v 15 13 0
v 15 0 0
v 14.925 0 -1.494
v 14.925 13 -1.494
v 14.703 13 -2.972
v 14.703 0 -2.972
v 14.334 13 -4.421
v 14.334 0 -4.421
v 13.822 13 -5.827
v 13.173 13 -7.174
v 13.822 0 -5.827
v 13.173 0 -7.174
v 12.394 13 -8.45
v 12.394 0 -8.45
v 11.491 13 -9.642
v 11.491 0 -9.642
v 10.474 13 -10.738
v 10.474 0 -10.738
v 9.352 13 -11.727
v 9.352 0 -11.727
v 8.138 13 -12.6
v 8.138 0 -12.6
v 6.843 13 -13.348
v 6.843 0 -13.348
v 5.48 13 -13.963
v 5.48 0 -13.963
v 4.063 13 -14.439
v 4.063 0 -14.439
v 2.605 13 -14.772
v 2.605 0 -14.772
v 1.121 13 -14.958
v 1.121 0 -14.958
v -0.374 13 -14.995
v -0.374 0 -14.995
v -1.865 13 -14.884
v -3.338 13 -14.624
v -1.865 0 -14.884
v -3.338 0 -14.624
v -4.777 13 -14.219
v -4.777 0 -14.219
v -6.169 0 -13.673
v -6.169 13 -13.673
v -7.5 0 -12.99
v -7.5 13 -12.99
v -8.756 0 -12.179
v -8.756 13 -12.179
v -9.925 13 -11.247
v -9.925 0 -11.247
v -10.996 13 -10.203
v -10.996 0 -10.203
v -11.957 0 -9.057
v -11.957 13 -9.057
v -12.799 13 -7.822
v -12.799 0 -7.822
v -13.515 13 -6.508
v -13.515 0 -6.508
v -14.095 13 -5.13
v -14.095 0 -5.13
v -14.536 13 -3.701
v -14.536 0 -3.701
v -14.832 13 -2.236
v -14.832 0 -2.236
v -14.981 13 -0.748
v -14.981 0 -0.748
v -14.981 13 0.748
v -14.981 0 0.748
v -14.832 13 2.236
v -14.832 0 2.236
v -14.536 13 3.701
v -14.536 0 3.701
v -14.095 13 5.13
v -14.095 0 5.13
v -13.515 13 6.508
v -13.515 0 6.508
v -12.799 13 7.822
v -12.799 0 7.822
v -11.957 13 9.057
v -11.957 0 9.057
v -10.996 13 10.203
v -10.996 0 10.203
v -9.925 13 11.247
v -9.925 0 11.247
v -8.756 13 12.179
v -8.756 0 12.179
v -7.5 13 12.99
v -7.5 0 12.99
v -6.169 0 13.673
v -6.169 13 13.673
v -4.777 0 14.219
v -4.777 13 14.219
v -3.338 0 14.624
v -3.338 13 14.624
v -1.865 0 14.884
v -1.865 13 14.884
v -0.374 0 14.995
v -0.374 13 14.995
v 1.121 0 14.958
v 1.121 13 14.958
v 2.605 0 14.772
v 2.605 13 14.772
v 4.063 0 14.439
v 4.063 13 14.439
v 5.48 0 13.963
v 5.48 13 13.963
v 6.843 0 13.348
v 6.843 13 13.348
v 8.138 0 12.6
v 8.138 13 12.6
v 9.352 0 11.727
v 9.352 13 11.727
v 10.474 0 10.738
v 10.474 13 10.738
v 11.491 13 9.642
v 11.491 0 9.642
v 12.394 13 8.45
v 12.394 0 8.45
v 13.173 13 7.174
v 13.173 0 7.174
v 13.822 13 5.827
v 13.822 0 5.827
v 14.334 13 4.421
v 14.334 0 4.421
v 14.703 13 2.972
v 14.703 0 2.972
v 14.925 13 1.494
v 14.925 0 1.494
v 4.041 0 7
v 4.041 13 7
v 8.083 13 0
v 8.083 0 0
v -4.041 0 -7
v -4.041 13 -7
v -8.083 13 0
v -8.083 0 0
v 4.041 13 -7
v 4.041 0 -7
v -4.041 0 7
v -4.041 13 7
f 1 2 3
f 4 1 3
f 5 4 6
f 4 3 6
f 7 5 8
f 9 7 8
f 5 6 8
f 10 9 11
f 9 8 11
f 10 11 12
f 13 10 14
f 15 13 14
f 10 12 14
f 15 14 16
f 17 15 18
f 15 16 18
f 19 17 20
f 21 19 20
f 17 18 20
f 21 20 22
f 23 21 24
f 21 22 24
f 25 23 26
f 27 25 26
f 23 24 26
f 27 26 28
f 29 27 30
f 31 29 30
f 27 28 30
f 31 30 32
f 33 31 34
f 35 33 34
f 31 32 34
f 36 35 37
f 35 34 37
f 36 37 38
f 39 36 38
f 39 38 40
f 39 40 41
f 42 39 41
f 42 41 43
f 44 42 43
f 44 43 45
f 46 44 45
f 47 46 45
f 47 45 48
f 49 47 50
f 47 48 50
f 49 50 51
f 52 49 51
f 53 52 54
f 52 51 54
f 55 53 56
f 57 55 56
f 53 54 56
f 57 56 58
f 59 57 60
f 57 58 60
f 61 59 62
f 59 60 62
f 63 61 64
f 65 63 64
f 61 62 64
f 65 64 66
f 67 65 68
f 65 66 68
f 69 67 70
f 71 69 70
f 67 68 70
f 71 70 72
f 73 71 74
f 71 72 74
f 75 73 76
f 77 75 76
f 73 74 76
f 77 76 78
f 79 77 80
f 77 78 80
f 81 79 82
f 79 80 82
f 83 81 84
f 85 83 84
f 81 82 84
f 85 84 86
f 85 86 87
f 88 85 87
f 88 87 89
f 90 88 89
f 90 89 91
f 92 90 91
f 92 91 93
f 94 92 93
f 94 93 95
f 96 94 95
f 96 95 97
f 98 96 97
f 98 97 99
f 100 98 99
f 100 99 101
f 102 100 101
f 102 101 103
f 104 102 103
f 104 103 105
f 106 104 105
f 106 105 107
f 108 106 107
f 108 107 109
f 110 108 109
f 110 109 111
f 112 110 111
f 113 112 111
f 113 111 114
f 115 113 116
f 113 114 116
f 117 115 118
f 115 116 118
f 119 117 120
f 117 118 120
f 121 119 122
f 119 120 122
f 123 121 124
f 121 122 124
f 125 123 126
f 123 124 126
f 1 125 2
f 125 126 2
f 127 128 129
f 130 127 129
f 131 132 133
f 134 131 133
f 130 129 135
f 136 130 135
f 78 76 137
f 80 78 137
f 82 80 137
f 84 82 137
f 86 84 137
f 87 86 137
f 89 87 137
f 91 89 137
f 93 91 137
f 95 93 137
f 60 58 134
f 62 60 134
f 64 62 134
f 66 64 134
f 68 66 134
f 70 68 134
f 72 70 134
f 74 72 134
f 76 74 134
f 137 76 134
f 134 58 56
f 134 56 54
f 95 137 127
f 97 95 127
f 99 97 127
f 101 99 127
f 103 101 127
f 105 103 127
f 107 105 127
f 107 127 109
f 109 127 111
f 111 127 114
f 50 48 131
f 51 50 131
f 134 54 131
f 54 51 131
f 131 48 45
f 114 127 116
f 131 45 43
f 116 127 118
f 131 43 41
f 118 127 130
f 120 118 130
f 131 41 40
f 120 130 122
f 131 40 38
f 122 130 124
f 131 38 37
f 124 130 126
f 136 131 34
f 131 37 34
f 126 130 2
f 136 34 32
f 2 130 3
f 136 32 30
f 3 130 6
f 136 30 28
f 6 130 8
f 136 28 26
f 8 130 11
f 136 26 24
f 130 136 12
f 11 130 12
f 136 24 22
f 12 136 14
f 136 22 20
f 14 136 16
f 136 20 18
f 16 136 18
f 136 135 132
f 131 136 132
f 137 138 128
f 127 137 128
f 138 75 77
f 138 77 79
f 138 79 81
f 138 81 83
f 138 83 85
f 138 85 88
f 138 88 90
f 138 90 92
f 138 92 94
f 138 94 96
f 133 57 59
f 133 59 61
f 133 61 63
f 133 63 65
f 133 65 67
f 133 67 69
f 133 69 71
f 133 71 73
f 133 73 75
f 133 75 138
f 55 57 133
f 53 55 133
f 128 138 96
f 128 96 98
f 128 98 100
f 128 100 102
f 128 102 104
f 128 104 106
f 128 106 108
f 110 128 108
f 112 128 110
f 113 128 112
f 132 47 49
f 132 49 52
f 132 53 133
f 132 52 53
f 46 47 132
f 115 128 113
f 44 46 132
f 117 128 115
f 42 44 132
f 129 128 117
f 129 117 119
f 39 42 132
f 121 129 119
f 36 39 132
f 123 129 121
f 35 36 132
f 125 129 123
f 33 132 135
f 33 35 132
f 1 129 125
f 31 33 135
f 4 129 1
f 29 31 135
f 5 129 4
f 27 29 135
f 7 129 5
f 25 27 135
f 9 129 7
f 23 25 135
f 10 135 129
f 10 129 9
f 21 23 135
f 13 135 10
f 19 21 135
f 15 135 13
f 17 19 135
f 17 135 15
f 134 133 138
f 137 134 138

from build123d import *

# Parameters (mm, degrees)
SKETCH1_R               = 15
BOSS_EXTRUDE1_DEPTH     = 13
CUT_EXTRUDE1_DEPTH      = 26
CUT_EXTRUDE1_DEPTH_BACK = 32


with BuildPart() as part:
    # Sketch1 → Boss-Extrude1 (new body)
    with BuildSketch(Plane(origin=(0, 0, 0), x_dir=(1, 0, 0), z_dir=(0, 1, 0))):
        Circle(SKETCH1_R)
    extrude(amount=BOSS_EXTRUDE1_DEPTH)

    # Sketch3 → Cut-Extrude1 (cut, two sides)
    with BuildSketch(Plane(origin=(0, 13, 0), x_dir=(1, 0, 0), z_dir=(0, 1, 0))) as cut_extrude1_sk:
        Polygon((8.082903769, 0), (4.041451884, 7), (-4.041451884, 7), (-8.082903769, 0), (-4.041451884, -7), (4.041451884, -7), align=None)
    extrude(amount=CUT_EXTRUDE1_DEPTH, mode=Mode.SUBTRACT)
    extrude(cut_extrude1_sk.sketch, amount=-CUT_EXTRUDE1_DEPTH_BACK, mode=Mode.SUBTRACT)


solid = part.part
